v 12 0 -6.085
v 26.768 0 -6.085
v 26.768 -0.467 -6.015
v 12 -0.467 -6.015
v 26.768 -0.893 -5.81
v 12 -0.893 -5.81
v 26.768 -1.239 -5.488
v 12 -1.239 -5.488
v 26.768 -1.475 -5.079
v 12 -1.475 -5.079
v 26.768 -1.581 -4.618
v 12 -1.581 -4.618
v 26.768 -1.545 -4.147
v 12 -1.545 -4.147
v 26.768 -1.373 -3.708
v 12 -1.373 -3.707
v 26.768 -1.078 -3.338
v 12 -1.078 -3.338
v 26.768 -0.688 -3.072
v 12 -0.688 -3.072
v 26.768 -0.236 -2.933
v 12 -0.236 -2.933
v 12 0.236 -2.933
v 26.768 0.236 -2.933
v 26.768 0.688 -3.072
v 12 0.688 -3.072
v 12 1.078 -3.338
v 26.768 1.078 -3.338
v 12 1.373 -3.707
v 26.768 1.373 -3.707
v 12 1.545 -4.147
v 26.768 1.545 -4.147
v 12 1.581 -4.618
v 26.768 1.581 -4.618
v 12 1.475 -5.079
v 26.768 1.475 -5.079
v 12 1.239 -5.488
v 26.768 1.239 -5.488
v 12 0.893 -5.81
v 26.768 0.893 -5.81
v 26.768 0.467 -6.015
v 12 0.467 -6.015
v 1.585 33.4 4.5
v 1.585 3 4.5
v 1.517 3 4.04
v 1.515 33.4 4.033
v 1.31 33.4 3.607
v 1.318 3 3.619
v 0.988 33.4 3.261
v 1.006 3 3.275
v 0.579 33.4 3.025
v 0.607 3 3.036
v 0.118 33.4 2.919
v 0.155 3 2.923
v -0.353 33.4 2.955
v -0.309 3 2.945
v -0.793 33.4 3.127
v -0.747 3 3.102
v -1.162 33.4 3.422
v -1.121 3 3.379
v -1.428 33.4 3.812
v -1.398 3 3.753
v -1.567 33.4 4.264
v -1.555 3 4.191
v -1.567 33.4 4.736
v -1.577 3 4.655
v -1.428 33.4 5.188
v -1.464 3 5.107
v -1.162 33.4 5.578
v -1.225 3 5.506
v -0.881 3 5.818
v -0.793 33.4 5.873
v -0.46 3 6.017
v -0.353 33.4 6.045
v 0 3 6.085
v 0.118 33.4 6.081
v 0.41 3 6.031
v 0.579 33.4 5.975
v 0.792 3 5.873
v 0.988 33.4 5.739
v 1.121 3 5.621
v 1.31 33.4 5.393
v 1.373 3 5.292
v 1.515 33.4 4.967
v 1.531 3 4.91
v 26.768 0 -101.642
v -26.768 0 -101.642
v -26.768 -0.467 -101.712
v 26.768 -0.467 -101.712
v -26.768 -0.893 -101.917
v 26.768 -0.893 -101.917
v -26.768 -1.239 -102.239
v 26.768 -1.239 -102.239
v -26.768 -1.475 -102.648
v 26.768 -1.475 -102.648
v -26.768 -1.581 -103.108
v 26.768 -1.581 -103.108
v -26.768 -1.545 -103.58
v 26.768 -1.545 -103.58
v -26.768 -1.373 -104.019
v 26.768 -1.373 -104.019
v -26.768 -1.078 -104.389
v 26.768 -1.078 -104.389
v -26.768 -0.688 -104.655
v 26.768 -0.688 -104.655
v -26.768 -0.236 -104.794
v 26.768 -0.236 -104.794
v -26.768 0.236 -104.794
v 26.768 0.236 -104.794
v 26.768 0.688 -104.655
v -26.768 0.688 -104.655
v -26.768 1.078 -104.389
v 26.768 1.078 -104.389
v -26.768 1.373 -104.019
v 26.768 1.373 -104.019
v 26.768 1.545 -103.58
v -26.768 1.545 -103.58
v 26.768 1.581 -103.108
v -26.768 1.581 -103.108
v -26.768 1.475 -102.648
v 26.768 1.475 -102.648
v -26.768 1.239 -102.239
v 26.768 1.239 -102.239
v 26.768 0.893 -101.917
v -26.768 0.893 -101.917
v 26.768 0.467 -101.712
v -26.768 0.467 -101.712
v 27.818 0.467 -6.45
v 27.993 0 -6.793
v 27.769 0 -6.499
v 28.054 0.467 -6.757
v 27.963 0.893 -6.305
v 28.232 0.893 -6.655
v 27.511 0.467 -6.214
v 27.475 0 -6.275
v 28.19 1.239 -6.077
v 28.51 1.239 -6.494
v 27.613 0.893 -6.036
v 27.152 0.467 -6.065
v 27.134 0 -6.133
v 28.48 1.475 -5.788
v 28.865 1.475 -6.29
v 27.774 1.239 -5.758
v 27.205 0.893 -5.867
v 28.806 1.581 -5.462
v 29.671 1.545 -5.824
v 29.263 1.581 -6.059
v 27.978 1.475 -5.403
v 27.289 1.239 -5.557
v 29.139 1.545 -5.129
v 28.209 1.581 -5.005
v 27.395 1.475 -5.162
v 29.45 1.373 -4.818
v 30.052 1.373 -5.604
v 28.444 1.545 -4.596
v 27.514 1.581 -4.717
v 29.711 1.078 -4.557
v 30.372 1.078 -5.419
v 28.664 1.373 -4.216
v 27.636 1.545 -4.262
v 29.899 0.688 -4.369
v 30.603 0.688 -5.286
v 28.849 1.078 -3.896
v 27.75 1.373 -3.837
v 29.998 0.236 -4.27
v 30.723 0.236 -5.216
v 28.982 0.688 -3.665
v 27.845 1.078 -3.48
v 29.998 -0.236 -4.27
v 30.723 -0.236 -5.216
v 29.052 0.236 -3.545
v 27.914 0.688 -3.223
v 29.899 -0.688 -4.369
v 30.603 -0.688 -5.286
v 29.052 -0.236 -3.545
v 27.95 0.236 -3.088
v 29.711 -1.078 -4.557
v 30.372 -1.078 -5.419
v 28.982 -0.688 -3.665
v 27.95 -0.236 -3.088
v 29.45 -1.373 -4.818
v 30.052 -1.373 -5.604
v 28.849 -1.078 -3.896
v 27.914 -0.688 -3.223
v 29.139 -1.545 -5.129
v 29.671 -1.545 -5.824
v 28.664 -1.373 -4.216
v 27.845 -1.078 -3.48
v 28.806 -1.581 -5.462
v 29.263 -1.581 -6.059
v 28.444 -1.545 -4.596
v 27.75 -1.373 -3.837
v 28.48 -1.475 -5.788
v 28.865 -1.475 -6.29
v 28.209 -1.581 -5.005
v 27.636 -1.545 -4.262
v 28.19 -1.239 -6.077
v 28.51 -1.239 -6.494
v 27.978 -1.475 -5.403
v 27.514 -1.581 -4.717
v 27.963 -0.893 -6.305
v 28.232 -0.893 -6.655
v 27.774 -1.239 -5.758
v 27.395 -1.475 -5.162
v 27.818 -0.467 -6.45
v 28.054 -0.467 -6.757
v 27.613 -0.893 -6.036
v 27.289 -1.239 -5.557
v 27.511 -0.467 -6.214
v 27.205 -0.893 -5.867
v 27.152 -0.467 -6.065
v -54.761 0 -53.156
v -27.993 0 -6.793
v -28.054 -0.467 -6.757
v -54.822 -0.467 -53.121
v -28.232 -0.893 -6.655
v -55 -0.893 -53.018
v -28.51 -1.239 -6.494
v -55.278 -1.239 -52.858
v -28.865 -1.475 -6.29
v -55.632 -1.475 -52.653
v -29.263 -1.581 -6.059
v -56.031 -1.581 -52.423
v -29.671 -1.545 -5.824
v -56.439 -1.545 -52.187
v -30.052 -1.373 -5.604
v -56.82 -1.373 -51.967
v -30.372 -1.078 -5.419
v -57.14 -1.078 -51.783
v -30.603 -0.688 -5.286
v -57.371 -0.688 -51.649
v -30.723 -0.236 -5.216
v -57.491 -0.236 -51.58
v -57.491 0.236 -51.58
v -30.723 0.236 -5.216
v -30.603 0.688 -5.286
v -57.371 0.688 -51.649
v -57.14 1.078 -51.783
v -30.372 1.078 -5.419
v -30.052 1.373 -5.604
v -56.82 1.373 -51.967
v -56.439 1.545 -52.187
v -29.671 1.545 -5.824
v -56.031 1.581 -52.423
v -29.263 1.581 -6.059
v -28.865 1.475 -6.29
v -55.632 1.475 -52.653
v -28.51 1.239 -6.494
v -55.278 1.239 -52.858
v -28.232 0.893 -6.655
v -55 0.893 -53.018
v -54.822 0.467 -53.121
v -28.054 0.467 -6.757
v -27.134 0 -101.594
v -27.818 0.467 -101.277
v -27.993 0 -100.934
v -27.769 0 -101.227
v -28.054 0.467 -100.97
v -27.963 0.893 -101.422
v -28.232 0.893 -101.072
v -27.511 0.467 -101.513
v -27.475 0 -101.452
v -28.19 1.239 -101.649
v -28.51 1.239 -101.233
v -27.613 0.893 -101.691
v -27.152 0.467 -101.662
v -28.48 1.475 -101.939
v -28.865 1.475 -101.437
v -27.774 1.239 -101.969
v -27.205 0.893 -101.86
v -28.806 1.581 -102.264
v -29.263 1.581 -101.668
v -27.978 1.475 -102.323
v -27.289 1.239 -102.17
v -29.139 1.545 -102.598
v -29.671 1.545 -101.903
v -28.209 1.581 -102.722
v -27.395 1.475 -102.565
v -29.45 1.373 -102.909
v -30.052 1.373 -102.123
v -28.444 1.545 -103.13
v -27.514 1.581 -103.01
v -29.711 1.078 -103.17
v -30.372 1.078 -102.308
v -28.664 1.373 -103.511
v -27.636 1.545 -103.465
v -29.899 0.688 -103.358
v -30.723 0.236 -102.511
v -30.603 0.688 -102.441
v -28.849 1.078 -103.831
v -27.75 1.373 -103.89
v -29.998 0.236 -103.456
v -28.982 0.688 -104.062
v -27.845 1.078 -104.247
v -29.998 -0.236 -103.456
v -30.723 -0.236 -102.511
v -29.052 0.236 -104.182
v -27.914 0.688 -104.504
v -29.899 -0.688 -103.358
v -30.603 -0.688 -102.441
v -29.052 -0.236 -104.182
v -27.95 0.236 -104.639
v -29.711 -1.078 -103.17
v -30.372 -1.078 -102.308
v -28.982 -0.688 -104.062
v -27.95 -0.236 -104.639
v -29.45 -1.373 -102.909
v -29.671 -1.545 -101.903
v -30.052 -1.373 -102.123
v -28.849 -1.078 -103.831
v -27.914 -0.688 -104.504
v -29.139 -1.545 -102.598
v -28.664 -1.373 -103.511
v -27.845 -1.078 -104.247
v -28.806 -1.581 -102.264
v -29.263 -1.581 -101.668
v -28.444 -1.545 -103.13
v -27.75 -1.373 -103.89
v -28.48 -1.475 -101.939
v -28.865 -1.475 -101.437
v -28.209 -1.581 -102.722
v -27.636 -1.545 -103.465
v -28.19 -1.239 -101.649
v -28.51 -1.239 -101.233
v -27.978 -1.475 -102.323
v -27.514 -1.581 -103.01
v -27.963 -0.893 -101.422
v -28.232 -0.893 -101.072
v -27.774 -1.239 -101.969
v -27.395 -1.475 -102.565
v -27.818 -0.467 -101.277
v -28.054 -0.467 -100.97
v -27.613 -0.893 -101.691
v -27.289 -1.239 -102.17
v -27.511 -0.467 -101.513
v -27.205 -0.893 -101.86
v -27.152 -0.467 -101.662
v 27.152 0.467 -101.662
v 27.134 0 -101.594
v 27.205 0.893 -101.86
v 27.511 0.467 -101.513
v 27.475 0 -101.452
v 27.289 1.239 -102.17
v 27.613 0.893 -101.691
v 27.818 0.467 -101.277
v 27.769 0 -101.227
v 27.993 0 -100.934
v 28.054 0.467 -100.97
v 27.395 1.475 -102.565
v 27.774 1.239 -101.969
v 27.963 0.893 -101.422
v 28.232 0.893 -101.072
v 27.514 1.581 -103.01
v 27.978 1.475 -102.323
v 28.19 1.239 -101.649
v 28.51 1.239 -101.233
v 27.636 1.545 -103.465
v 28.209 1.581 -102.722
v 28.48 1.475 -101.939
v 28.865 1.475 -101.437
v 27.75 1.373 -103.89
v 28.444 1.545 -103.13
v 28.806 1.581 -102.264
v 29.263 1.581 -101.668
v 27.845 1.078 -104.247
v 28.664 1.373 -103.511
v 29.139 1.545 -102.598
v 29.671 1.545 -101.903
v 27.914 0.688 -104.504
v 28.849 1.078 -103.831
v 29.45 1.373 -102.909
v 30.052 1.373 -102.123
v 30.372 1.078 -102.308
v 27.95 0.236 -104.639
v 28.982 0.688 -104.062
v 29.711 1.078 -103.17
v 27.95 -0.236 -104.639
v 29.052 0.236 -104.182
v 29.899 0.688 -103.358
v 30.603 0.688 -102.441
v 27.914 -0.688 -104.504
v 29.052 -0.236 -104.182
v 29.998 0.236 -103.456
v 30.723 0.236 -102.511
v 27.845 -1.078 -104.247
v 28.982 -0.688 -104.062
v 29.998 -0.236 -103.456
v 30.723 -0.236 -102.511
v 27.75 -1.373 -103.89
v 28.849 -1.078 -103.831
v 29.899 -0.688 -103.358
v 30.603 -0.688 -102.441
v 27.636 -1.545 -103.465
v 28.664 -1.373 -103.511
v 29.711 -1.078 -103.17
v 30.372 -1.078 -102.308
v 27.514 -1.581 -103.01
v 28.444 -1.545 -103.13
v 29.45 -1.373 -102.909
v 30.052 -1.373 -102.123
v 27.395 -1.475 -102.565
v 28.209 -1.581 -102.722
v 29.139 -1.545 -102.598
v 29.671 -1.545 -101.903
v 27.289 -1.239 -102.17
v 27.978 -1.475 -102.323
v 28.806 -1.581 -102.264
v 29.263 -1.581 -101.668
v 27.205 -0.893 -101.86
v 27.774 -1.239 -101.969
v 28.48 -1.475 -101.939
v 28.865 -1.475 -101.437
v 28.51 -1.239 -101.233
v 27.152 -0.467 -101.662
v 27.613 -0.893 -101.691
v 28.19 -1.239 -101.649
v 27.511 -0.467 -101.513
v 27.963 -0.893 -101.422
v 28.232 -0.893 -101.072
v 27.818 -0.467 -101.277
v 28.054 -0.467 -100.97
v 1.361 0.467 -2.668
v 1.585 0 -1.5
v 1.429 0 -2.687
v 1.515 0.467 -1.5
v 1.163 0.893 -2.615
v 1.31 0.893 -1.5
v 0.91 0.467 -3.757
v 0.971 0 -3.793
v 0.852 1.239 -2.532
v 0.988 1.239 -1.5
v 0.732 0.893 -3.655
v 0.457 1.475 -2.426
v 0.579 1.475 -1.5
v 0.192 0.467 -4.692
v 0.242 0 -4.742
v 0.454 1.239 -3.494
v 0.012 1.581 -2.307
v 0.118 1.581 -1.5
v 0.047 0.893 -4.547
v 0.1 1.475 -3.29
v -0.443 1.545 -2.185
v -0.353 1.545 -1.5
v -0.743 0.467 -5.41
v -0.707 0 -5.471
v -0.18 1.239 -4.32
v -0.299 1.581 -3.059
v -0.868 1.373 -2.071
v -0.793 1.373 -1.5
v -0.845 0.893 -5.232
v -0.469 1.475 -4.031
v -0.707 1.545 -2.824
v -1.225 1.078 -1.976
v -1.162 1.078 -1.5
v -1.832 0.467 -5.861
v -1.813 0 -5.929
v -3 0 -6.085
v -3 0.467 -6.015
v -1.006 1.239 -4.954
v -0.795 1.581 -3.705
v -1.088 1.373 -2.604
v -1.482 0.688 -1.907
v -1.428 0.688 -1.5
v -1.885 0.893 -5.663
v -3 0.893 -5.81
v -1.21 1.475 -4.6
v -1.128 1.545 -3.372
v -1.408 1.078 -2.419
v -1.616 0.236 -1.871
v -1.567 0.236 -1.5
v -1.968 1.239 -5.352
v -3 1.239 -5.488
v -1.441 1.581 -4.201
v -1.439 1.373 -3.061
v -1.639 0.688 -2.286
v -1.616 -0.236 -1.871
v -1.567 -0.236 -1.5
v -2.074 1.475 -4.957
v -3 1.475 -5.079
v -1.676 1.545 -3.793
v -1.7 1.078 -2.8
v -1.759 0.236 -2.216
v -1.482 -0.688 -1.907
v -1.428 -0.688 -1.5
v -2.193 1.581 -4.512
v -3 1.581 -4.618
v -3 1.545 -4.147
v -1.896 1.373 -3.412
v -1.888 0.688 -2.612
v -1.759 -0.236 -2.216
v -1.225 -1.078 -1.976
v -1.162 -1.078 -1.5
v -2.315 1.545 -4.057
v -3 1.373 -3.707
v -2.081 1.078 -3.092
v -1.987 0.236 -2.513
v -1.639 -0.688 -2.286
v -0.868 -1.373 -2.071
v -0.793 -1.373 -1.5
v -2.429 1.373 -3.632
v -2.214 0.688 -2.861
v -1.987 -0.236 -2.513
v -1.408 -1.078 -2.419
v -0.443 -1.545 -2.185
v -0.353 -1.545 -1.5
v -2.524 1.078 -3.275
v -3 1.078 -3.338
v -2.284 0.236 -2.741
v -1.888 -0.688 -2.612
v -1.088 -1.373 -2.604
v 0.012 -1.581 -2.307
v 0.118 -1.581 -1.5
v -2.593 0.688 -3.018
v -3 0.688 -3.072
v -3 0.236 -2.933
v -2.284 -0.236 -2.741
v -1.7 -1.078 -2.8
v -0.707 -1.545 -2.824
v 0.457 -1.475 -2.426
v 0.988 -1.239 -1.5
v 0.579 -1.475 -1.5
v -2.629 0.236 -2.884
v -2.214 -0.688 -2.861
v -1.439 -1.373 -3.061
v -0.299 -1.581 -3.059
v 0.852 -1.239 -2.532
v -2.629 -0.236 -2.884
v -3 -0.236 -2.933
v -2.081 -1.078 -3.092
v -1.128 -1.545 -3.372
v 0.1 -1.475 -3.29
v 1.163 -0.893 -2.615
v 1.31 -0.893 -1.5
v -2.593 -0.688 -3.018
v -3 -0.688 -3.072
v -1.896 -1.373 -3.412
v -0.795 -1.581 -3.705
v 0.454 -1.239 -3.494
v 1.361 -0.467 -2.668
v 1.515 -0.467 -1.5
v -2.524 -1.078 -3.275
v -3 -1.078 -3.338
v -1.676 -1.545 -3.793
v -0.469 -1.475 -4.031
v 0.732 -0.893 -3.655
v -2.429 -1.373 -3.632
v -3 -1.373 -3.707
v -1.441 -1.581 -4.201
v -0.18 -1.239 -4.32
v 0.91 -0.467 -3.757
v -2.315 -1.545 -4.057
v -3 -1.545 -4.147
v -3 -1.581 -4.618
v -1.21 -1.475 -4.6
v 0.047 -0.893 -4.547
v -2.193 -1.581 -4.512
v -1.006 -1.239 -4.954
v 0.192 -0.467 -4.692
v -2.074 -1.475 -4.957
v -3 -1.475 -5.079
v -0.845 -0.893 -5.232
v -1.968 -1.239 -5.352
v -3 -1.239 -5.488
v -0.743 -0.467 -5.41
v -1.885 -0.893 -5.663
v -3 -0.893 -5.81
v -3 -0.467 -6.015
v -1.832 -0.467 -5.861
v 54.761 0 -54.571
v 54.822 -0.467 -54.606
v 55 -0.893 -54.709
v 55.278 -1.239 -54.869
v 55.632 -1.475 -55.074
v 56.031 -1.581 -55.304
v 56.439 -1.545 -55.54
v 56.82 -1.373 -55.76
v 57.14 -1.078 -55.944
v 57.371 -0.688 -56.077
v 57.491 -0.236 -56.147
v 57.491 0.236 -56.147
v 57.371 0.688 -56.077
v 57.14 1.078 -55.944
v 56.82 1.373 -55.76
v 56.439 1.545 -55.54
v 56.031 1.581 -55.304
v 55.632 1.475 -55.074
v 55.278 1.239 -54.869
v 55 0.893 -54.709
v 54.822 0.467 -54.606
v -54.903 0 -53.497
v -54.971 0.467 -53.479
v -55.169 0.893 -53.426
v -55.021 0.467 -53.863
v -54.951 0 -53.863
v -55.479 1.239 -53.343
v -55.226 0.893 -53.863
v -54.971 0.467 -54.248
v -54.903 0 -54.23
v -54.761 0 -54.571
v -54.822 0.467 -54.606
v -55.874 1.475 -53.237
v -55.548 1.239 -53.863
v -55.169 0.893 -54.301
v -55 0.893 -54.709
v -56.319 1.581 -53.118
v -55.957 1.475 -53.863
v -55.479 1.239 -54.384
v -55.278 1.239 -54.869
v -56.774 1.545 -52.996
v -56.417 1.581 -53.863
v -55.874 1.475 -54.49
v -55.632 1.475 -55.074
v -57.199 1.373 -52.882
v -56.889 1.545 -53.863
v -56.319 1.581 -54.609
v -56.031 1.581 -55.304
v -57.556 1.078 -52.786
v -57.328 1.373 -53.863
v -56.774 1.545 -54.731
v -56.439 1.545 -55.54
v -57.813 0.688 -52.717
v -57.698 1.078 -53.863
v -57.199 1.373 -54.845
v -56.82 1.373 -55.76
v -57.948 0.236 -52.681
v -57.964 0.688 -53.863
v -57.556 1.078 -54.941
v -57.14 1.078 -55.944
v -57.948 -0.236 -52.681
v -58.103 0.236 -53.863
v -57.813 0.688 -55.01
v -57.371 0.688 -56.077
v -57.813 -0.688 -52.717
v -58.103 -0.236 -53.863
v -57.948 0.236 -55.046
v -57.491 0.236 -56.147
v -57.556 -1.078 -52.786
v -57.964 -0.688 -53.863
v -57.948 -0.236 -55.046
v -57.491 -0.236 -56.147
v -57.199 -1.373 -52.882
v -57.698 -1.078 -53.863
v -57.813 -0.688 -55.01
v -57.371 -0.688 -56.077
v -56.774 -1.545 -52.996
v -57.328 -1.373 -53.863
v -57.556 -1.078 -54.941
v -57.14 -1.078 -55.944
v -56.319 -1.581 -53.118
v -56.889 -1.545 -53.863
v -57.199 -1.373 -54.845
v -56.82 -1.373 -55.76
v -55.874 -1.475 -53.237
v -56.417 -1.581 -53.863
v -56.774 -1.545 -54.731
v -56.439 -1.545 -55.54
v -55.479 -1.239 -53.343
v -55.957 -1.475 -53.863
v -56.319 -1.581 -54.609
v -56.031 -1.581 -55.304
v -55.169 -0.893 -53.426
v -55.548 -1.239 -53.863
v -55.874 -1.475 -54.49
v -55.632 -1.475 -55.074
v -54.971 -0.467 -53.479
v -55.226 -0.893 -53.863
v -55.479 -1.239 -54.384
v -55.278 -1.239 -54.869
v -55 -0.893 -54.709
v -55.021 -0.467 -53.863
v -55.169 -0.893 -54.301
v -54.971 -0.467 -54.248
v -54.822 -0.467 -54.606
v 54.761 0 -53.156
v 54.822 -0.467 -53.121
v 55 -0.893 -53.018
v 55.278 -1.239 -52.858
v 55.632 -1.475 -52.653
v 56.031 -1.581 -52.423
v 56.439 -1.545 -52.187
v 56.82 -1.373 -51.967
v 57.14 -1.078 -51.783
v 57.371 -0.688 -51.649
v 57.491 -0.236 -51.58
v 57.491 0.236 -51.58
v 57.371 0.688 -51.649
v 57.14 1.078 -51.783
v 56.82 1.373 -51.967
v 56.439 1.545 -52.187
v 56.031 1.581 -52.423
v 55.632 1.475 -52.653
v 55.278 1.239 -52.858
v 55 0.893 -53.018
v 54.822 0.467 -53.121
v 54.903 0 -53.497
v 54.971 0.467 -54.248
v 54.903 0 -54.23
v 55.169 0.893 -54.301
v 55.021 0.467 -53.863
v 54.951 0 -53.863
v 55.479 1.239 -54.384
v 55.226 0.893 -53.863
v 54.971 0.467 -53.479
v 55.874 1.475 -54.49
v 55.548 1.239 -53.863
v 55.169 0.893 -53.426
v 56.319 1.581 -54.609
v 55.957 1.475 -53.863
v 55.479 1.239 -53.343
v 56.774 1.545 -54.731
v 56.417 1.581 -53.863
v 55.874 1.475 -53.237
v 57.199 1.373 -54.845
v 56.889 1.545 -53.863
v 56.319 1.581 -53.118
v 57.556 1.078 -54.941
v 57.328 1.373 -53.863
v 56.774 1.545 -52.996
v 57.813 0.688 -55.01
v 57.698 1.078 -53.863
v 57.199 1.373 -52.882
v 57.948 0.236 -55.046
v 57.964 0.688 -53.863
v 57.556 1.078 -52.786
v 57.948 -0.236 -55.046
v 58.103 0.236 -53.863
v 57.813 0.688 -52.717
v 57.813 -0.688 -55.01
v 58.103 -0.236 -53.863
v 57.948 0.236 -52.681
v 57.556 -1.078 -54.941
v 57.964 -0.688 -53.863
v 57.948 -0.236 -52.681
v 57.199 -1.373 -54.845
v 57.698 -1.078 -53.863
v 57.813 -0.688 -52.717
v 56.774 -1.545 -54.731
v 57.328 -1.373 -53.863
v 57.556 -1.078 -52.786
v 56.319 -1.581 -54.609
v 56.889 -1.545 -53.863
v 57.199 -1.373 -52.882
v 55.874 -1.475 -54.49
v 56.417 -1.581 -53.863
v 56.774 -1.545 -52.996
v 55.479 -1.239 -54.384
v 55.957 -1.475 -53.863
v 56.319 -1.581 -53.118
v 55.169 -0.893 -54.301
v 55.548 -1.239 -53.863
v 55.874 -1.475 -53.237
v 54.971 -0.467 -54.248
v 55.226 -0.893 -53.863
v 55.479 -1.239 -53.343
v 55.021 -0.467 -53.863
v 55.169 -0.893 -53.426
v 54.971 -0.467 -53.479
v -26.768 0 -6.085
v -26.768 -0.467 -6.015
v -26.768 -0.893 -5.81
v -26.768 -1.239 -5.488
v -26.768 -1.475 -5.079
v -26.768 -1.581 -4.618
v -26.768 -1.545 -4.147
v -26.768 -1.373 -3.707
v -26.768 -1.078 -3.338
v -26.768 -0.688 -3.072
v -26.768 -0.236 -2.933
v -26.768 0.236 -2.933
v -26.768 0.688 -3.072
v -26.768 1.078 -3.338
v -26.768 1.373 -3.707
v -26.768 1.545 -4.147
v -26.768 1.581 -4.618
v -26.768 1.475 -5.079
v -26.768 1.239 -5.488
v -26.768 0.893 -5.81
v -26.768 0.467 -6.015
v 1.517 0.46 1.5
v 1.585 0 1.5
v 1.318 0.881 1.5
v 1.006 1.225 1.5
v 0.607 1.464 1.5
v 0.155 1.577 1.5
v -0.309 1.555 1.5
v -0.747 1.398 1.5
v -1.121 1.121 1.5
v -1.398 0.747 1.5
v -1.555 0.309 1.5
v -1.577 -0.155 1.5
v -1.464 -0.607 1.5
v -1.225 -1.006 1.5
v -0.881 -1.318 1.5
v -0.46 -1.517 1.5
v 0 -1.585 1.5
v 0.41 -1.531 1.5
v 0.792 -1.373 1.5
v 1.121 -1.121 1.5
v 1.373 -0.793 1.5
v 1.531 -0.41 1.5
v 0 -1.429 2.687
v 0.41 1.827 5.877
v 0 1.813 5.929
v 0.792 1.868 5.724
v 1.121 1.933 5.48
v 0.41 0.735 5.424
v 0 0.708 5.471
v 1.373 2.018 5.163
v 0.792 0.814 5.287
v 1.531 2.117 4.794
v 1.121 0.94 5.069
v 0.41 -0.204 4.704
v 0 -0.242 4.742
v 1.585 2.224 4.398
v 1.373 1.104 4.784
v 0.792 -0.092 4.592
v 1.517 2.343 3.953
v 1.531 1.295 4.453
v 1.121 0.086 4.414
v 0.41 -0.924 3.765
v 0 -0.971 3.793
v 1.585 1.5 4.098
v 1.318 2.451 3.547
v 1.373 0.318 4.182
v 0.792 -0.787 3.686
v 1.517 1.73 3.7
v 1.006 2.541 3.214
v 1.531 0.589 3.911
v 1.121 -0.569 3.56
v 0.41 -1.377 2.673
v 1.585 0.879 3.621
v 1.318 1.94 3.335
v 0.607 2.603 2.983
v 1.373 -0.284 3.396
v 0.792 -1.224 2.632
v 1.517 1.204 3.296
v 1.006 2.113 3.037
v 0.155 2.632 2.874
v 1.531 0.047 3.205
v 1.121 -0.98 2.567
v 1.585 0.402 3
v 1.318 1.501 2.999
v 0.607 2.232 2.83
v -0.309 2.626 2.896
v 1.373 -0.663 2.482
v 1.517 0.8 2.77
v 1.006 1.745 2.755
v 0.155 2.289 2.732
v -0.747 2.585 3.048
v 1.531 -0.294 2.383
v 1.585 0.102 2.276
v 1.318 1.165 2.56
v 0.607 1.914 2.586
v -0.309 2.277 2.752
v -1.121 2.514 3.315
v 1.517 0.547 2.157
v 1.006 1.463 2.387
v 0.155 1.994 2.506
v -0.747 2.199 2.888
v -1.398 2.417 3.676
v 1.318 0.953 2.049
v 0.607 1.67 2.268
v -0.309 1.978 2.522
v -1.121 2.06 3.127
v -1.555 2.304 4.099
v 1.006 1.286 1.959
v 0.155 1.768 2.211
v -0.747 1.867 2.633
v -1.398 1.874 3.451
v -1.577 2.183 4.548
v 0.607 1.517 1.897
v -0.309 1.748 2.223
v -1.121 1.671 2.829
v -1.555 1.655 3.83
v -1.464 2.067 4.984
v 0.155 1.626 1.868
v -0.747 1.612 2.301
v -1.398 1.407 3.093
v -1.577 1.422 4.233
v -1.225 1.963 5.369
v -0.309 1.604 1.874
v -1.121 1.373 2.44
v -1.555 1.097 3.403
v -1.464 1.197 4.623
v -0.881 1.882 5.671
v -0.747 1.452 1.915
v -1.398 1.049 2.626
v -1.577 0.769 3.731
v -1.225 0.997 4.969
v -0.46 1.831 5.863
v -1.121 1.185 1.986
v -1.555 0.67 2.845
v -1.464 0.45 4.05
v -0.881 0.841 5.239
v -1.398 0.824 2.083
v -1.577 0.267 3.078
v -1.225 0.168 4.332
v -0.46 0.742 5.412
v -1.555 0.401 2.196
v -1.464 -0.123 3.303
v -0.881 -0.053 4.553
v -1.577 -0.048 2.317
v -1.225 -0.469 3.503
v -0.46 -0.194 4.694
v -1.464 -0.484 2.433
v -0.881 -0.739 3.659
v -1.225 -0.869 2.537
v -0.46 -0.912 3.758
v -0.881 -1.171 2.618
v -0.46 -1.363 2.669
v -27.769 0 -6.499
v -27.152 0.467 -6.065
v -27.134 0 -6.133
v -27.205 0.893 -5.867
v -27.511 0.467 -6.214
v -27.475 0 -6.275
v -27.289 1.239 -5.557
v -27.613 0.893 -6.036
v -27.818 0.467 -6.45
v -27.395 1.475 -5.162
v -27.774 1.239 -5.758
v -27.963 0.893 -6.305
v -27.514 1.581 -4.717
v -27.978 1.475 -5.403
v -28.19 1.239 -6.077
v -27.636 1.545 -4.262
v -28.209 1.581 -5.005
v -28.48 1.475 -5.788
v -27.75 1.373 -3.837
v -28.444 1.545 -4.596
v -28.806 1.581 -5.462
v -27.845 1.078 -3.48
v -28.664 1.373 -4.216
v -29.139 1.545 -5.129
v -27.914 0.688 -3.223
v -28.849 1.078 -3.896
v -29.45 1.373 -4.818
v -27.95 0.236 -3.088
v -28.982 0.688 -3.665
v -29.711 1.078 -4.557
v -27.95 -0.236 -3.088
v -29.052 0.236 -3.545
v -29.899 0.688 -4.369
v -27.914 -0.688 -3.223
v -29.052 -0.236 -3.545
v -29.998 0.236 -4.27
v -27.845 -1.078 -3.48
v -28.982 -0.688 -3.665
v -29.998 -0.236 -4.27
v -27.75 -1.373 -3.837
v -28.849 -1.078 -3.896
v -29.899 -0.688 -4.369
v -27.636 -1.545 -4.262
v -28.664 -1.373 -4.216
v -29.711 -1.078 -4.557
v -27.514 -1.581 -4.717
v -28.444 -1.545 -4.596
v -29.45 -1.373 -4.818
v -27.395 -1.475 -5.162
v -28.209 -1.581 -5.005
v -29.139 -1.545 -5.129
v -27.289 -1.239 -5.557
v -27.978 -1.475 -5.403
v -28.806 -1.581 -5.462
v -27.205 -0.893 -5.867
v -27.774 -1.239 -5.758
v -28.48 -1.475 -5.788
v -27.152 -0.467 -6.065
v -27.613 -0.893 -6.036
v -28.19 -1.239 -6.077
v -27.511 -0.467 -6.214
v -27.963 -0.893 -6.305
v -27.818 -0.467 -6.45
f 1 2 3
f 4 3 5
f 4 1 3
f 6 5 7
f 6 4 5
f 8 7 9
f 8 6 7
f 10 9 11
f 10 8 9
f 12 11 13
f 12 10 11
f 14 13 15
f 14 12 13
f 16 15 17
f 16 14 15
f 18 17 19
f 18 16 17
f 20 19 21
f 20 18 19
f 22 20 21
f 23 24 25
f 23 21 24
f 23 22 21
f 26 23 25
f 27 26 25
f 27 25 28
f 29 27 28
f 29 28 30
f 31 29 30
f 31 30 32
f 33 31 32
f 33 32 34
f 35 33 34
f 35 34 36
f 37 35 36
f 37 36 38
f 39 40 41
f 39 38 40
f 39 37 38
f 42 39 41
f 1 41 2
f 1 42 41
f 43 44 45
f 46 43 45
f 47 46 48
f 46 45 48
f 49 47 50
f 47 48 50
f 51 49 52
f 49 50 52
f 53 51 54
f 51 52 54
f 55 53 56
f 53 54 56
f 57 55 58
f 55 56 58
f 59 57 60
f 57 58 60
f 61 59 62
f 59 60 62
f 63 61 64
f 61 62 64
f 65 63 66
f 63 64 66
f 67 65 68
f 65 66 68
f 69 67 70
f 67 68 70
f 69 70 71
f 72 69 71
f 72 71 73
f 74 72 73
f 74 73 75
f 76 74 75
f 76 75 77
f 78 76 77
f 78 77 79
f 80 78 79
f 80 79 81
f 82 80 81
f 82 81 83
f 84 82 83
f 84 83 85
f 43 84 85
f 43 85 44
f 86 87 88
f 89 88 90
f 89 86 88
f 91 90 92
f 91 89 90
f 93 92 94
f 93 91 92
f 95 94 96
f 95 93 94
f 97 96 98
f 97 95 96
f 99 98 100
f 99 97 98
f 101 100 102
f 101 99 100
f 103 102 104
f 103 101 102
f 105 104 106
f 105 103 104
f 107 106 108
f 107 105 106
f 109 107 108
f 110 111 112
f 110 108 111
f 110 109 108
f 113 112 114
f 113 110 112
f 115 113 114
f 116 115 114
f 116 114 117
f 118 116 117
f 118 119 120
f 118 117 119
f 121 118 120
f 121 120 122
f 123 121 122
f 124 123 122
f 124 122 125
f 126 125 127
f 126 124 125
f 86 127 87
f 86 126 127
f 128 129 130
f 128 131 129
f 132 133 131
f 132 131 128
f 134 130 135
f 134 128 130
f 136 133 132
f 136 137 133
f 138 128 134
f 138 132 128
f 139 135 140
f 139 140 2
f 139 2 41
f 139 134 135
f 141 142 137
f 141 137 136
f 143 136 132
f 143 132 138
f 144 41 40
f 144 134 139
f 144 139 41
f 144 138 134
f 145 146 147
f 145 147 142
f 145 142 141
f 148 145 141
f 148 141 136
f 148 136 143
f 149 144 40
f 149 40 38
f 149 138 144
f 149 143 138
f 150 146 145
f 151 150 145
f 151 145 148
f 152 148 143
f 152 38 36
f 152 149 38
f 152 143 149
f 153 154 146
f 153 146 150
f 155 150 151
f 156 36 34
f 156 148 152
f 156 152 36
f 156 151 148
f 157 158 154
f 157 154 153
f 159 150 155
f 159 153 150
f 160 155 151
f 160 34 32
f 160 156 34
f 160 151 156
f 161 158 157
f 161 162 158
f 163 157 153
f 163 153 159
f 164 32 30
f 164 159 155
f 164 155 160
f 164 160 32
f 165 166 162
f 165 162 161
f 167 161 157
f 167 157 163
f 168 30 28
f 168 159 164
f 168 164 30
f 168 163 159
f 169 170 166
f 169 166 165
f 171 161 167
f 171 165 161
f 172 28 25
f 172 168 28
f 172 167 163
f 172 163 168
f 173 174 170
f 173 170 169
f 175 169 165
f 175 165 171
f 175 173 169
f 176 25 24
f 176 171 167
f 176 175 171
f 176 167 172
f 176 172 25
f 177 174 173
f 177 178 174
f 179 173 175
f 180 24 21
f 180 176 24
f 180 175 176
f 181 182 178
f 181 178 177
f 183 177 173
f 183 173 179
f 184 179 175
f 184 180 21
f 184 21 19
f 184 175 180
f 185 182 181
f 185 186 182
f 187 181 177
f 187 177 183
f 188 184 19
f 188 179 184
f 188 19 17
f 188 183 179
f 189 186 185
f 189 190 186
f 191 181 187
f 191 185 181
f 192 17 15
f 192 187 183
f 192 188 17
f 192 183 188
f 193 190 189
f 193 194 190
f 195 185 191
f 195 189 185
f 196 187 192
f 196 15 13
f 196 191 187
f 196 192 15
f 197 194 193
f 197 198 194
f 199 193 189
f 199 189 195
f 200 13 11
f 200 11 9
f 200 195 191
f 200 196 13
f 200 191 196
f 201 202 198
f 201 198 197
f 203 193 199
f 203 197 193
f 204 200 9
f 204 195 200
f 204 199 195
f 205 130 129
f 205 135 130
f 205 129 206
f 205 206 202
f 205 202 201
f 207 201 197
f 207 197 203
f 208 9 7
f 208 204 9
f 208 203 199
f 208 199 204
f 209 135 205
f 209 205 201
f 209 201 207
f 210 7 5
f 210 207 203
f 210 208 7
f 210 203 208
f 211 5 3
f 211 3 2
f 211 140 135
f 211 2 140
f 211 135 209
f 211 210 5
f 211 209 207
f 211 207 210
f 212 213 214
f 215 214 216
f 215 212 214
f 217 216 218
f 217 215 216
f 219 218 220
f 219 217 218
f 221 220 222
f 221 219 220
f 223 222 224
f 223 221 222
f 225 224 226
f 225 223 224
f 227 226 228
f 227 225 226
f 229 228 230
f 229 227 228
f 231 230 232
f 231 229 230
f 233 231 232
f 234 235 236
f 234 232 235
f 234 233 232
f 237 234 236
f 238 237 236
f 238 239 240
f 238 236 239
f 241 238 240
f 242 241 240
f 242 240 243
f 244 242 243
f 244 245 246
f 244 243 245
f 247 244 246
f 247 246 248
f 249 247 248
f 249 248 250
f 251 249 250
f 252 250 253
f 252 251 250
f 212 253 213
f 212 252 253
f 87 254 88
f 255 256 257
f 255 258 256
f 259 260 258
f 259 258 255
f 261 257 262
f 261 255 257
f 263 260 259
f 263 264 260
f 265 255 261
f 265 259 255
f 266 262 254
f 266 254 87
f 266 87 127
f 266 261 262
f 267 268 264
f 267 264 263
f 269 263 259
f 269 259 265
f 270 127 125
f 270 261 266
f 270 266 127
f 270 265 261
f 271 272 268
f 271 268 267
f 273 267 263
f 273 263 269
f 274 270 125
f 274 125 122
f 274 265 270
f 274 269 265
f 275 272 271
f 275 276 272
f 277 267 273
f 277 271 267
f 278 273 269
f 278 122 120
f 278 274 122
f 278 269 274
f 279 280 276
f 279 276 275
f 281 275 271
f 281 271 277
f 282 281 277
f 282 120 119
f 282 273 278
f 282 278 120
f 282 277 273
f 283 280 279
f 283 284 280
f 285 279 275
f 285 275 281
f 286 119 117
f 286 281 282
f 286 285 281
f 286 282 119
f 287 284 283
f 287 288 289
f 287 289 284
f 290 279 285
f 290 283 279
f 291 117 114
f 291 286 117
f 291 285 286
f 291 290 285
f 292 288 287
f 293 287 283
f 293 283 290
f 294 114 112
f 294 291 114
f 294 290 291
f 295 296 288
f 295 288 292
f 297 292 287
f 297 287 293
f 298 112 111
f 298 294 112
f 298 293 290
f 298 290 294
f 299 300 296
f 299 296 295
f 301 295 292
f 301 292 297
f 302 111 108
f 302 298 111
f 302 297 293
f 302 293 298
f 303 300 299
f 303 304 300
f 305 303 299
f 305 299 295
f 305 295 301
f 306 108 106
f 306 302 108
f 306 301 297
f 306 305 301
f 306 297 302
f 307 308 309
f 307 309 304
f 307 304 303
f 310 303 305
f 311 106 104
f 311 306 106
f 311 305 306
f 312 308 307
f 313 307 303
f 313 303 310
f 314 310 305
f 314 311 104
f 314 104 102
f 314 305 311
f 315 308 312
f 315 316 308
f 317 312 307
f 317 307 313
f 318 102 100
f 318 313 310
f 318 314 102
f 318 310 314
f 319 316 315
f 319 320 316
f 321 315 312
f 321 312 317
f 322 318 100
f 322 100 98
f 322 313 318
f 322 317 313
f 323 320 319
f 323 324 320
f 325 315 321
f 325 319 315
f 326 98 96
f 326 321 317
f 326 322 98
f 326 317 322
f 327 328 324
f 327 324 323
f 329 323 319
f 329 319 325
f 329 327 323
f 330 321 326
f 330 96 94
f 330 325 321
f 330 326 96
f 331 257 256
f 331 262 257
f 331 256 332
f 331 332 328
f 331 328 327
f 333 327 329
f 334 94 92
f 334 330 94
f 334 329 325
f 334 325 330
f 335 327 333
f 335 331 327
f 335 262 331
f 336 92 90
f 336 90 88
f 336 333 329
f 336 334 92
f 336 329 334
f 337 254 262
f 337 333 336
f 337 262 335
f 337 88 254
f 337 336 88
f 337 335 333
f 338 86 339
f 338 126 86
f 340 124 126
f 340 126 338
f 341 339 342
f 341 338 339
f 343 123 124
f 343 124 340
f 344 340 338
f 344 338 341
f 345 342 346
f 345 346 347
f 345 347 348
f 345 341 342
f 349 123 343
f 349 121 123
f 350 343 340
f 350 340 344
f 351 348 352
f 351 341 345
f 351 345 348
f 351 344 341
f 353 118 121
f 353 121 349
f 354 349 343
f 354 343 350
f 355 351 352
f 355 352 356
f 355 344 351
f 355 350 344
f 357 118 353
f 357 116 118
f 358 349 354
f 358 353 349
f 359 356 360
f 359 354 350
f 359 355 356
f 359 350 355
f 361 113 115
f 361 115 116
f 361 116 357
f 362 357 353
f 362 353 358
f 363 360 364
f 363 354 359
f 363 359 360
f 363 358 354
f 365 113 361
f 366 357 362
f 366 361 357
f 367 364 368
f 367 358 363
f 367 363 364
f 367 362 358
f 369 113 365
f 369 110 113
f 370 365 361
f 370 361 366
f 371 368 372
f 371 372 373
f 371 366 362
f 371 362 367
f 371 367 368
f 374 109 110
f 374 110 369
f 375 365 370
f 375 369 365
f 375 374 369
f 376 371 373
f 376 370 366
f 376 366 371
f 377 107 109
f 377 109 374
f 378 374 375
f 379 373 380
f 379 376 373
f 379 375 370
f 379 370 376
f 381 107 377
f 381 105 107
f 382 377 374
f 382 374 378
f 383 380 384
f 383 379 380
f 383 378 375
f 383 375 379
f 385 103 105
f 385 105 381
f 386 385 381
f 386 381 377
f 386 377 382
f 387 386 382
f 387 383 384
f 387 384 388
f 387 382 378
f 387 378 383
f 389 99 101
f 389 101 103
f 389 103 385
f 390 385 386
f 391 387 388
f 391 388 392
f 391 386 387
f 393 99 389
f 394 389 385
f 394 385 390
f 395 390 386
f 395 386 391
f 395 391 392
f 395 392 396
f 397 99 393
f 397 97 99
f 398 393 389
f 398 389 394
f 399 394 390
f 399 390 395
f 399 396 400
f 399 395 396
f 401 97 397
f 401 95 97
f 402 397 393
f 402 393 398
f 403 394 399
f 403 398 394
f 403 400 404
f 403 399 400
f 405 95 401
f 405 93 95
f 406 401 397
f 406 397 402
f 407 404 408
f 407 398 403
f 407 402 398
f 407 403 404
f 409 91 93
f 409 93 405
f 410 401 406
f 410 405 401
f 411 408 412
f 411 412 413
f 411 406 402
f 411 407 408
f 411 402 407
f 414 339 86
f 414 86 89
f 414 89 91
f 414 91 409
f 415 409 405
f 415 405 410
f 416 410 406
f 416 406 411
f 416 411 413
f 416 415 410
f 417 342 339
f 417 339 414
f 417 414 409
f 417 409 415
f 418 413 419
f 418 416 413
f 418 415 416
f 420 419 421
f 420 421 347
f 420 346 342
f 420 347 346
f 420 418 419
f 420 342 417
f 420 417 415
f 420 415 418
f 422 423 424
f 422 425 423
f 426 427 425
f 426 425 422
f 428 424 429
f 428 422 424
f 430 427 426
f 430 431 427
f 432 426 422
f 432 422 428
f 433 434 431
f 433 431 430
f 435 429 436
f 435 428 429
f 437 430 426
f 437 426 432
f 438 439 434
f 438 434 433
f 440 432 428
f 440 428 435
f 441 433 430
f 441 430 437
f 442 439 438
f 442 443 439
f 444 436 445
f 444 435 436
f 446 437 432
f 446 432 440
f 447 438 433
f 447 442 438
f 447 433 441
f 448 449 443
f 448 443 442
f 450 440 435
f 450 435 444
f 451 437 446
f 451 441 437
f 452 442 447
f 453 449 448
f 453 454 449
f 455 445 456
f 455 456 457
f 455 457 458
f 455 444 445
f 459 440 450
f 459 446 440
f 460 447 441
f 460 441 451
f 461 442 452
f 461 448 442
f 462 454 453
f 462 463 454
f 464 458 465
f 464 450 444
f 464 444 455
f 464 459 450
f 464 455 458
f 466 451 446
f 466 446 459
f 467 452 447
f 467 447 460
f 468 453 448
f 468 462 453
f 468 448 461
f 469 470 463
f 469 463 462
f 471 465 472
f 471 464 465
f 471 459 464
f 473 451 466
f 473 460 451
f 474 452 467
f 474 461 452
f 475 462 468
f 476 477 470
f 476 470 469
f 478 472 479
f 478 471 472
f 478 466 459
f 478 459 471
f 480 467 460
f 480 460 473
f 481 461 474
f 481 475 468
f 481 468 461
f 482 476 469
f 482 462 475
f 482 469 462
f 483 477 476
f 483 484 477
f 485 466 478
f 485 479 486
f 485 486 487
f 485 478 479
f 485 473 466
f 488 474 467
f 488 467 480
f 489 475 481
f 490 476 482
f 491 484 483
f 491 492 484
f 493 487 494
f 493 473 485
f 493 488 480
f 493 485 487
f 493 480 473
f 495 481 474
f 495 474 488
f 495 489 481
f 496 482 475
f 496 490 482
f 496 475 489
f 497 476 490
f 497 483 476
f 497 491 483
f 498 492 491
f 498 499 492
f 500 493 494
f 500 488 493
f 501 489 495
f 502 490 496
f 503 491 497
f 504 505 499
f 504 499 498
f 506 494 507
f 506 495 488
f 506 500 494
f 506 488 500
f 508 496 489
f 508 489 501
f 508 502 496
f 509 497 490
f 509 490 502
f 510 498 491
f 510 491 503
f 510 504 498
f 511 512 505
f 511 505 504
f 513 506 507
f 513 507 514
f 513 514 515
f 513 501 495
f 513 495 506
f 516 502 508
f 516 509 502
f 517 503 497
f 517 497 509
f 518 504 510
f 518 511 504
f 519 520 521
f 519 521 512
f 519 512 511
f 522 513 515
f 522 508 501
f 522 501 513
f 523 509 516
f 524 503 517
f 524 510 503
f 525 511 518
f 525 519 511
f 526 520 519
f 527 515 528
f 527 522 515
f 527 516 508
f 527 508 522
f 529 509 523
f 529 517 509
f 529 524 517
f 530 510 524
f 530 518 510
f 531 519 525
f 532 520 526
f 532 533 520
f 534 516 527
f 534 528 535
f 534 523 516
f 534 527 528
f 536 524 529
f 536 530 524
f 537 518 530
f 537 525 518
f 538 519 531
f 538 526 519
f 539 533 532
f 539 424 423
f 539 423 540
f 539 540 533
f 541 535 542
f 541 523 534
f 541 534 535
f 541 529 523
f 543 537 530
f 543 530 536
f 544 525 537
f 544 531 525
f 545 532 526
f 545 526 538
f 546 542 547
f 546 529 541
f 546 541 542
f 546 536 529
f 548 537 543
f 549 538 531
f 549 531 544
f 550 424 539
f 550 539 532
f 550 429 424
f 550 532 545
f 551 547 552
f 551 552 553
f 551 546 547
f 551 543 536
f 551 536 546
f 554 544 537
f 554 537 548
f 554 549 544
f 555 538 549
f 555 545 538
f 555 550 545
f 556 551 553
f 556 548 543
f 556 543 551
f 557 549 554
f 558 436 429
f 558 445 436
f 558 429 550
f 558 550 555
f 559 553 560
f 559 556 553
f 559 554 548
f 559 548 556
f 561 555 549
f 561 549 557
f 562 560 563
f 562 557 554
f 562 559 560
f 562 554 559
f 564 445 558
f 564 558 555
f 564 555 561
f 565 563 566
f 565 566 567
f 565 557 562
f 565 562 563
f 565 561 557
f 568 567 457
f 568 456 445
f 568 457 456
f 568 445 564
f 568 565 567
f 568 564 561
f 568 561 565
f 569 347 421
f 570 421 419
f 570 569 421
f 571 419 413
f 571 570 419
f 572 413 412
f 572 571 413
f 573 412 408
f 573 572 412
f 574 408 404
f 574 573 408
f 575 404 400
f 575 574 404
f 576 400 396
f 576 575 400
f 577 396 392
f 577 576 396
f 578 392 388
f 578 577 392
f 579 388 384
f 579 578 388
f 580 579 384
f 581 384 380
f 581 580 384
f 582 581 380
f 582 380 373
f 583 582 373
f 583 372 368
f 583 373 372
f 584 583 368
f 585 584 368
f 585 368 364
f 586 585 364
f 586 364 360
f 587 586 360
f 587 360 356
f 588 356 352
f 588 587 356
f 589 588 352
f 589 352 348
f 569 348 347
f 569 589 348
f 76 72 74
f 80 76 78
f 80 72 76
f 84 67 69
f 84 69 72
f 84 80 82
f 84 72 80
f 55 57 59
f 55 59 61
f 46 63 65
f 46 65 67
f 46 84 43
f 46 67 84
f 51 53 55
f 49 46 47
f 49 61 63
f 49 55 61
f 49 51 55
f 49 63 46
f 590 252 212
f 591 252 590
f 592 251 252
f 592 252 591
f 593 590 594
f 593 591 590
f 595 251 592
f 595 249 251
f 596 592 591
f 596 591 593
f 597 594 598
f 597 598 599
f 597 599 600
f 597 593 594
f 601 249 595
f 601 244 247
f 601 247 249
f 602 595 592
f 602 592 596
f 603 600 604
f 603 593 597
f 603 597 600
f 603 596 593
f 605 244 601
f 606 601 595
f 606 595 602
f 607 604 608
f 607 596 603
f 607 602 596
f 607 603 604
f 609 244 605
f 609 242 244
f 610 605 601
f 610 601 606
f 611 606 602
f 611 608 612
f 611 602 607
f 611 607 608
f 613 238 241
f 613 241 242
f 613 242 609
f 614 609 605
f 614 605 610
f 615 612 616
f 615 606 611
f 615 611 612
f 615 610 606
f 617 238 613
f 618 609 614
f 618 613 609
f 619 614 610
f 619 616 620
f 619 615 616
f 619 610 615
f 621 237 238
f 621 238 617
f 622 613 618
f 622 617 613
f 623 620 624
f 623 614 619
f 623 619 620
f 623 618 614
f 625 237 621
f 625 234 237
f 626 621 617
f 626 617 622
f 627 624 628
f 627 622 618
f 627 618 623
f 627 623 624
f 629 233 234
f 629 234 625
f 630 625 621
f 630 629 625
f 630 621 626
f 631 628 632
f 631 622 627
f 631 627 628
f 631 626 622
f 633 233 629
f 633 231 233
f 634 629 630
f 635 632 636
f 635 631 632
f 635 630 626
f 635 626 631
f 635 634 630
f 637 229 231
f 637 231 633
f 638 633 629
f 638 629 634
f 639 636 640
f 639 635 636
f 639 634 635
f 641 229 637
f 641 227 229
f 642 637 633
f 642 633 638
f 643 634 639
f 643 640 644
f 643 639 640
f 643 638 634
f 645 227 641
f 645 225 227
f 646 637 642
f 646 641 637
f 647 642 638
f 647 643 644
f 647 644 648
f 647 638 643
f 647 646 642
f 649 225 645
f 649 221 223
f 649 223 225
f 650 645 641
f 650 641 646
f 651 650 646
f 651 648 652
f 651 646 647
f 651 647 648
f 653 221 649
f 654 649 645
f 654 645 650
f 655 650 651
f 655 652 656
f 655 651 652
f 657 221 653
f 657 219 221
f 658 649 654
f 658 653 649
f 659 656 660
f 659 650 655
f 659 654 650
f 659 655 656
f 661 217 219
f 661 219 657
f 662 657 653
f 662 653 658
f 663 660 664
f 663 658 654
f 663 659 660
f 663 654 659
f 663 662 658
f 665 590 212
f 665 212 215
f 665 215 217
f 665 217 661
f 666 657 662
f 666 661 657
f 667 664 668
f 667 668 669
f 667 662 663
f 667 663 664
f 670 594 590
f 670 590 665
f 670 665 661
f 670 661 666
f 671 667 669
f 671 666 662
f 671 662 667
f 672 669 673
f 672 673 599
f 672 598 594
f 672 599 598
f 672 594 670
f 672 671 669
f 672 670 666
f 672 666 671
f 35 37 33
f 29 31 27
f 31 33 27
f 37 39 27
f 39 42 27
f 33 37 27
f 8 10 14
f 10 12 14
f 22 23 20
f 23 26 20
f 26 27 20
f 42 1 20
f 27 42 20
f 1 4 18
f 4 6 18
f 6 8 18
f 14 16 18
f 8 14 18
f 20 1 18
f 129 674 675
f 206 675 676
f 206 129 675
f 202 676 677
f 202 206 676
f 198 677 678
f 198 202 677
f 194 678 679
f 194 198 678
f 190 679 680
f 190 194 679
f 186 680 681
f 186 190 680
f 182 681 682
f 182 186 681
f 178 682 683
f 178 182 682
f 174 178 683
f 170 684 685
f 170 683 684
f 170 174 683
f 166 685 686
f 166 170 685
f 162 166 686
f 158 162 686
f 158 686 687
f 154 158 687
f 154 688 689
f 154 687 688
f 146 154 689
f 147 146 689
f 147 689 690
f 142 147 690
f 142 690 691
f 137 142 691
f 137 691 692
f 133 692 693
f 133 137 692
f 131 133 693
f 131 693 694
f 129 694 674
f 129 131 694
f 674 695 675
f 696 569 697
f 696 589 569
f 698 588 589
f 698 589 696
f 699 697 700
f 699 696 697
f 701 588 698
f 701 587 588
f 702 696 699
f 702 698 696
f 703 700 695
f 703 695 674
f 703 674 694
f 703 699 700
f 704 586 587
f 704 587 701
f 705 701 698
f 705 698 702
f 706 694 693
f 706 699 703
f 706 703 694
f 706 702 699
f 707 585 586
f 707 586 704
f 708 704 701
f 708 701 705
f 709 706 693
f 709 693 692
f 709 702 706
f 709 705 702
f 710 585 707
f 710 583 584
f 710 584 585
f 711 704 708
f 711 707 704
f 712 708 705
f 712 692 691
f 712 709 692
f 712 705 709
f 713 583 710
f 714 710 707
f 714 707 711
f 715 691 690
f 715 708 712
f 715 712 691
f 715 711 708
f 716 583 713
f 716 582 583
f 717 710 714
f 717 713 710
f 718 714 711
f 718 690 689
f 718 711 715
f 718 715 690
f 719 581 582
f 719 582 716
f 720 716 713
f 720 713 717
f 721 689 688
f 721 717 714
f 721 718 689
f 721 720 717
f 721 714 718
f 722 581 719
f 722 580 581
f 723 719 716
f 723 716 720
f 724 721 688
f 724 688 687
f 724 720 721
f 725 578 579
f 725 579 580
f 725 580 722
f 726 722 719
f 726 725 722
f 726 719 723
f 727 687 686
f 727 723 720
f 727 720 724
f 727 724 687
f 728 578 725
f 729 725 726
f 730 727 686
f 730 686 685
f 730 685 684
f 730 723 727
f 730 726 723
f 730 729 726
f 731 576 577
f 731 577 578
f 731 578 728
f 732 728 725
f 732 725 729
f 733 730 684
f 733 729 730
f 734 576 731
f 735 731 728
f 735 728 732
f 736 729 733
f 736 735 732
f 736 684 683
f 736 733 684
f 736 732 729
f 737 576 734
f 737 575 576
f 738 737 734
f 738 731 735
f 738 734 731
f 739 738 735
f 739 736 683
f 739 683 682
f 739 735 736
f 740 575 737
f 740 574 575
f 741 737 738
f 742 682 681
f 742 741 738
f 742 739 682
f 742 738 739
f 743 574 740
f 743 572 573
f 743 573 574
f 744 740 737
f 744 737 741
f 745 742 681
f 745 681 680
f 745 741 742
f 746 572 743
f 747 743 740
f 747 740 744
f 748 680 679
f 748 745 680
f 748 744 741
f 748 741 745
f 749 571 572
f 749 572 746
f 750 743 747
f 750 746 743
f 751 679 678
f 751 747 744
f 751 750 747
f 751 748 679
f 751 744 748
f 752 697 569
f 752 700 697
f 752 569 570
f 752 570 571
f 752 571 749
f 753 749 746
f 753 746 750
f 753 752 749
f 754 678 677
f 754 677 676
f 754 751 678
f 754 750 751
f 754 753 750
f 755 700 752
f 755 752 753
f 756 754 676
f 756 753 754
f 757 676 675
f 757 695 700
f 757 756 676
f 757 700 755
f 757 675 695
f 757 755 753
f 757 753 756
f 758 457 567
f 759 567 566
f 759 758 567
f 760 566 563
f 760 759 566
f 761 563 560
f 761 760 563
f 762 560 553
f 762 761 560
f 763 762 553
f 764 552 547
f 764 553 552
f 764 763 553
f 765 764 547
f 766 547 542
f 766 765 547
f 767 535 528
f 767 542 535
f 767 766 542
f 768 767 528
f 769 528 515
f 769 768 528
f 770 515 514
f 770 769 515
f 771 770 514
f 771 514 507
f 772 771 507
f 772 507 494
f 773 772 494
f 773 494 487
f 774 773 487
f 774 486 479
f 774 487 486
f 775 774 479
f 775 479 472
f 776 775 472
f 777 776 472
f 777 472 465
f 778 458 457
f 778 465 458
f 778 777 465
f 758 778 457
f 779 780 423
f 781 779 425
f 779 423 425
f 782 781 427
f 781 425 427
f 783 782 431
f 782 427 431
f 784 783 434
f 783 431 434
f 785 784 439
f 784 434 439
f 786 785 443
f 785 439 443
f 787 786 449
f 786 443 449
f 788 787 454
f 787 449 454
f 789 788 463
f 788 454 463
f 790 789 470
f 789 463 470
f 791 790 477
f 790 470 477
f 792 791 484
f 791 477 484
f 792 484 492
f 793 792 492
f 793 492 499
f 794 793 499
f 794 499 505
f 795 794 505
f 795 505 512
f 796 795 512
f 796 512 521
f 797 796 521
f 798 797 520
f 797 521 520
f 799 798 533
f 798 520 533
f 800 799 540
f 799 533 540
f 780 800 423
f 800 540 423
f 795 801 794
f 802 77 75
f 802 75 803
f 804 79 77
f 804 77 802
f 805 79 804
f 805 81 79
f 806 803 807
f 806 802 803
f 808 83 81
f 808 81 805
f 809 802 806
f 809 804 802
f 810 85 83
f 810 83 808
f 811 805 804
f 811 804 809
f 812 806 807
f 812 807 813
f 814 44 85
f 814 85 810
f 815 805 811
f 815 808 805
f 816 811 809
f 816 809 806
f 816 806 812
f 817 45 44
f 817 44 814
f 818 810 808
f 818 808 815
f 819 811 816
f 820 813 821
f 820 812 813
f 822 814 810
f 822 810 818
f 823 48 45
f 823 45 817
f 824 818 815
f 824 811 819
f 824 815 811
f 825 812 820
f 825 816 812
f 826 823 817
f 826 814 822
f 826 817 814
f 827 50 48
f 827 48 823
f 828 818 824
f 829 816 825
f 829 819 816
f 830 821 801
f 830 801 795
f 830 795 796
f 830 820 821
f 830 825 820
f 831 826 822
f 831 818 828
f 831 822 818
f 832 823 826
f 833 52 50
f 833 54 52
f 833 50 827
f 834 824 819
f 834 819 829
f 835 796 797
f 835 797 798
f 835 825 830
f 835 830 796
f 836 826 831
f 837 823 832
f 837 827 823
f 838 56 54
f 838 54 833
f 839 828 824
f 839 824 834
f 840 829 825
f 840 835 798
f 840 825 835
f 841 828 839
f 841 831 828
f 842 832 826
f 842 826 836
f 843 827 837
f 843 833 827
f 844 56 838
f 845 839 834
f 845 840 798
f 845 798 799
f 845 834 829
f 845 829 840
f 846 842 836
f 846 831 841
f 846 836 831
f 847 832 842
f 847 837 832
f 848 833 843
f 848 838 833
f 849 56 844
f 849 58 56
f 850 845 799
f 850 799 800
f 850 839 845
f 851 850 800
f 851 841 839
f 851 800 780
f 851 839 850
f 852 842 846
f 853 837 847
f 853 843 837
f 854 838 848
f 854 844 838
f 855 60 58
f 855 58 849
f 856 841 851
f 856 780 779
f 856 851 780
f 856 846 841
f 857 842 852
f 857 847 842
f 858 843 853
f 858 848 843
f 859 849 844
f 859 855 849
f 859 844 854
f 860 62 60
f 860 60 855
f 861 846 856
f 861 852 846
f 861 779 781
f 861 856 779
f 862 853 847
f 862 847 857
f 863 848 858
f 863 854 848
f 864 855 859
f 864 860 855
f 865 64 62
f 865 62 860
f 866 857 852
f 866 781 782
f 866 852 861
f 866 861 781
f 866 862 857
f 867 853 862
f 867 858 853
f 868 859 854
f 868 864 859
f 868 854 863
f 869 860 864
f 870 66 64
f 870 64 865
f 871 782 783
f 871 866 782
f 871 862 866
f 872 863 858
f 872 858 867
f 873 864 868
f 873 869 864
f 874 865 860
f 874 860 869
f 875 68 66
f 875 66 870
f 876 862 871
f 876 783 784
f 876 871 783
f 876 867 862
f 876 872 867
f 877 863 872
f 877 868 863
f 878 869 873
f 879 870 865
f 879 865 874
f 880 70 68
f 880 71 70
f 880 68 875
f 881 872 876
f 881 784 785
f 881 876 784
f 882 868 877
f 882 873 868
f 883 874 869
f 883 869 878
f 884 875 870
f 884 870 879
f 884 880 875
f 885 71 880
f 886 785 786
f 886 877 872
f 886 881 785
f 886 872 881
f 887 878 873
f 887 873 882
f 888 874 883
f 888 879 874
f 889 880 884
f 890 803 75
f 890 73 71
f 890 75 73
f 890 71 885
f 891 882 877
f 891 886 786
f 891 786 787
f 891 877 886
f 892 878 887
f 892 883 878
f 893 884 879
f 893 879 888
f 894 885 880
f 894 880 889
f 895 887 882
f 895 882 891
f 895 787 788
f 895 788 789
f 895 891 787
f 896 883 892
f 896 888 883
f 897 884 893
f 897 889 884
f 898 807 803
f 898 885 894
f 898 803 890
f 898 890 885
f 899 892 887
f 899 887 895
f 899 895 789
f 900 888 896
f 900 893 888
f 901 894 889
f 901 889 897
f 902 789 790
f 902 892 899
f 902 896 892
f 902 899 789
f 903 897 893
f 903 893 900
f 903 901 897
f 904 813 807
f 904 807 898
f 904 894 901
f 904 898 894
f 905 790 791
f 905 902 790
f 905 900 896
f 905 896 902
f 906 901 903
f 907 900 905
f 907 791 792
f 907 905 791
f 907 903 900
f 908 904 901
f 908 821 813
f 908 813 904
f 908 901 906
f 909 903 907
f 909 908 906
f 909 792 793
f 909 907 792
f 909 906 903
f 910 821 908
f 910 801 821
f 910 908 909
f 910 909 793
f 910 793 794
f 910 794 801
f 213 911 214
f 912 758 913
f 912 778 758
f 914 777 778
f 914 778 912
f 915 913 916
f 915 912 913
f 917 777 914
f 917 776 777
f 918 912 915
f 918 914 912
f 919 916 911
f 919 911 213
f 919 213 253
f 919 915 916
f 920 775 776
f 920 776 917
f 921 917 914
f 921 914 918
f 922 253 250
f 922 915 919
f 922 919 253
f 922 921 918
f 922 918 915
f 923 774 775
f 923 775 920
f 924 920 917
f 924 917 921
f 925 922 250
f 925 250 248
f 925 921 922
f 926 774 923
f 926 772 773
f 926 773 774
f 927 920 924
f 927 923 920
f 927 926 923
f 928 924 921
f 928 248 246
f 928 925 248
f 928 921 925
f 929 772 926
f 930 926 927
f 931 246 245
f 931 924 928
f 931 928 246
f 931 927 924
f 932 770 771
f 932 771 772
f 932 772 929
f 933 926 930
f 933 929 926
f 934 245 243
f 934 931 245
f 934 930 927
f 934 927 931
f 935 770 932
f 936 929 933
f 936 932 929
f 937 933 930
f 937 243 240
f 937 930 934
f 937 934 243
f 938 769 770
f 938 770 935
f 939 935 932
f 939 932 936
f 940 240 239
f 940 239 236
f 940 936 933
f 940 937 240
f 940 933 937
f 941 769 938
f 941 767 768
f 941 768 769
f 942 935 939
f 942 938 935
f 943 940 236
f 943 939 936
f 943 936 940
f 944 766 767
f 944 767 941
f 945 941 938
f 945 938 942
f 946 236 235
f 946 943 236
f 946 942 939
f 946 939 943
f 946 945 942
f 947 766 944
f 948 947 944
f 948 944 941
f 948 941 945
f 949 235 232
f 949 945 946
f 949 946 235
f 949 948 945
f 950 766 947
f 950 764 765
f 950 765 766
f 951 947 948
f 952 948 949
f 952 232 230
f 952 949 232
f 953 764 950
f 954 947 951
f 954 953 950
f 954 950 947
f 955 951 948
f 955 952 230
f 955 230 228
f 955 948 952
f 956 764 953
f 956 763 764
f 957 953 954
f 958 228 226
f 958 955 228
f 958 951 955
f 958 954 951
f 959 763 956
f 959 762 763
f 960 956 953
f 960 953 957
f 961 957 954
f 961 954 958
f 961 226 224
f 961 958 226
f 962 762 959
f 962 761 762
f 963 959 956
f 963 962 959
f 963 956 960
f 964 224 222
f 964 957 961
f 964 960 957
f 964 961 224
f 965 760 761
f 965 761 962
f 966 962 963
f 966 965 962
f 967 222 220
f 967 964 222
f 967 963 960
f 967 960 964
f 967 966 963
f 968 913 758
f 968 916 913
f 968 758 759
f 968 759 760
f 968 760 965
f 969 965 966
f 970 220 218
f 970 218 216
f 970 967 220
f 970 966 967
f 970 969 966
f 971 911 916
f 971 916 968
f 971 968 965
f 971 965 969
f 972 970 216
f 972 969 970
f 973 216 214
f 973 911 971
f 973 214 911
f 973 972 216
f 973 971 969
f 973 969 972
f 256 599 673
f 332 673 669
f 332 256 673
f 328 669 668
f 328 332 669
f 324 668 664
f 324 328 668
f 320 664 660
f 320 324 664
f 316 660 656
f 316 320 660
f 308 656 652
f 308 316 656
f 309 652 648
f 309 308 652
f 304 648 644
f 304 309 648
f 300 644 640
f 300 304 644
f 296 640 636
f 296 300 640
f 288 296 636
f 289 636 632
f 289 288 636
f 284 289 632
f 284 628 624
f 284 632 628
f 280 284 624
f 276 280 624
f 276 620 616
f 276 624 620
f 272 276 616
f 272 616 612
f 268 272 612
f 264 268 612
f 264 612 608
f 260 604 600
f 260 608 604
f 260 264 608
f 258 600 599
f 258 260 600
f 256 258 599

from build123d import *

# Parameters (mm, degrees)
ESBO_O2_R              = 1.585
VARREDURA4_OUTLINE_R   = 1.585
VARREDURA4_ANGLE       = 90
VARREDURA4_START       = -1.5000001
VARREDURA4_2_OUTLINE_R = 1.585
VARREDURA4_2_DEPTH     = 3.0000002
VARREDURA4_START_2     = 2.9999999
VARREDURA4_3_OUTLINE_R = 1.585
VARREDURA4_3_DEPTH     = 30.4000001


with BuildPart() as part:
    # Varredura3: sweep along a path in Esboço1
    with BuildLine(Plane(origin=(0, 0, 0), x_dir=(1, 0, 0), z_dir=(0, 1, 0))) as varredura3_path:
        Line((0, 0), (0, 1.5))
        ThreePointArc((0, 1.5), (-0.878679656, 3.621320344), (-3, 4.5))
        Line((-3, 4.5), (-26.767949192, 4.5))
        ThreePointArc((-26.767949192, 4.5), (-28.267949192, 4.901923789), (-29.366025404, 6))
        Line((-29.366025404, 6), (-56.133974596, 52.363448016))
        ThreePointArc((-56.133974596, 52.363448016), (-56.535898385, 53.863448016), (-56.133974596, 55.363448016))
        Line((-56.133974596, 55.363448016), (-29.366025404, 101.726896031))
        ThreePointArc((-29.366025404, 101.726896031), (-28.267949192, 102.824972243), (-26.767949192, 103.226896031))
        Line((-26.767949192, 103.226896031), (26.767949192, 103.226896031))
        ThreePointArc((26.767949192, 103.226896031), (28.267949192, 102.824972243), (29.366025404, 101.726896031))
        Line((29.366025404, 101.726896031), (56.133974596, 55.363448016))
        ThreePointArc((56.133974596, 55.363448016), (56.535898385, 53.863448016), (56.133974596, 52.363448016))
        Line((56.133974596, 52.363448016), (29.366025404, 6))
        ThreePointArc((29.366025404, 6), (28.267949192, 4.901923789), (26.767949192, 4.5))
        Line((26.767949192, 4.5), (12, 4.5))
    # Esboço2 → Varredura3 (sweep)
    with BuildSketch(Plane.XY):
        Circle(ESBO_O2_R)
    sweep(path=varredura3_path.line)



with BuildPart() as body_2:
    # Varredura4: read off the stored shape, not the designer's step
    # Varredura4 outline → Varredura4 (revolve)
    with BuildSketch(Plane(origin=(0, 3, 1.5), x_dir=(0, 0, 1), z_dir=(0, 1, 0))):
        with Locations((3, 0)):
            Circle(VARREDURA4_OUTLINE_R)
    revolve(axis=Axis((0, 3, 1.5), (1, 0, 0)), revolution_arc=VARREDURA4_ANGLE)


with BuildPart() as part_1:
    add(part.part)

    add(body_2.part)  # Varredura4 2 merges body 2
    # Varredura4 2 outline → Varredura4 2 (add)
    with BuildSketch(Plane.XY.offset(VARREDURA4_START)):
        Circle(VARREDURA4_2_OUTLINE_R)
    extrude(amount=VARREDURA4_2_DEPTH)

    # Varredura4 3 outline → Varredura4 3 (add)
    with BuildSketch(Plane(origin=(0, 0, 0), x_dir=(1, 0, 0), z_dir=(0, 1, 0)).offset(VARREDURA4_START_2)):
        with Locations((0, -4.5)):
            Circle(VARREDURA4_3_OUTLINE_R)
    extrude(amount=VARREDURA4_3_DEPTH)


solid = part_1.part
